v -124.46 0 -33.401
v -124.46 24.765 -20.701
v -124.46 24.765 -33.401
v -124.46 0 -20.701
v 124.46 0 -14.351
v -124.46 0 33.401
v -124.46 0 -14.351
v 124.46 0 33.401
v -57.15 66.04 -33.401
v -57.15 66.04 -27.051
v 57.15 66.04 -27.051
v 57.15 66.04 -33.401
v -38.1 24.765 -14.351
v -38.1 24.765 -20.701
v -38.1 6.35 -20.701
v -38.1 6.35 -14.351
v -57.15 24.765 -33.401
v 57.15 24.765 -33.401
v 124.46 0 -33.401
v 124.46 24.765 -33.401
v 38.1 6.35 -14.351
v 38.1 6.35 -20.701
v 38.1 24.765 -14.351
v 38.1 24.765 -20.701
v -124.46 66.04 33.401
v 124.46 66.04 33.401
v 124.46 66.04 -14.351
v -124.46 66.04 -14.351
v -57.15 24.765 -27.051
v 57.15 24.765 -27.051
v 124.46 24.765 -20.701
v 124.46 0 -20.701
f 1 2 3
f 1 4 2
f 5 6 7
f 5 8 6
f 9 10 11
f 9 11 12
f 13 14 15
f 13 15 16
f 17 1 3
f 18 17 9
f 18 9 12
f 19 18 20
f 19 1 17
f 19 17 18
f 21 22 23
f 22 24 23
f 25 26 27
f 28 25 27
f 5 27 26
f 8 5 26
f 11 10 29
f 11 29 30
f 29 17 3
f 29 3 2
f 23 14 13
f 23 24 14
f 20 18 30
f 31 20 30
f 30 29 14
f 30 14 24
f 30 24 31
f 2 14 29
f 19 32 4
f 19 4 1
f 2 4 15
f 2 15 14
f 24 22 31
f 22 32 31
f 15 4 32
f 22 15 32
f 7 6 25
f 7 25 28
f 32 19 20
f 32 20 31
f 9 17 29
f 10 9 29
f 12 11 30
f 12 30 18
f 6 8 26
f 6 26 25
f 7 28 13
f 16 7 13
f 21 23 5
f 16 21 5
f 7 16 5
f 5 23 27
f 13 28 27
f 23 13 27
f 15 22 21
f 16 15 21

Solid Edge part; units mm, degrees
sketch "Sketch1" plane through (0, 0, 0) normal (0, -1, 0) x (1, 0, 0)
  line L0 (-124.46, -33.401) -> (124.46, -33.401)
  line L1 (124.46, -33.401) -> (124.46, 33.401)
  line L2 (124.46, 33.401) -> (-124.46, 33.401)
  line L3 (-124.46, 33.401) -> (-124.46, -33.401)
  dimension "D1" = 248.92
  dimension "D2" = 66.802
extrude "Protrusion1" add sketch "Sketch1" against normal blind 66.04
sketch "Sketch2" plane through (0, 66.04, 0) normal (0, 1, 0) x (-1, 0, 0)
  line L0 (57.15, -33.401) -> (124.46, -33.401)
  line L1 (124.46, -33.401) -> (124.46, -14.351)
  line L2 (124.46, -14.351) -> (-124.46, -14.351)
  line L3 (-124.46, -14.351) -> (-124.46, -33.401)
  line L4 (-124.46, -33.401) -> (-57.15, -33.401)
  line L5 (-57.15, -27.051) -> (-57.15, -33.401)
  line L6 (57.15, -27.051) -> (-57.15, -27.051)
  line L7 (57.15, -33.401) -> (57.15, -27.051)
  dimension "D1" = 19.05
extrude "ExtrudedCutout_1" cut sketch "Sketch2" against normal blind 41.275
sketch "Sketch3" plane through (124.46, 33.02, 0) normal (1, 0, 0) x (0, 1, 0)
  line L0 (-33.02, -14.351) -> (-33.02, -20.701)
  line L1 (-33.02, -20.701) -> (-26.67, -20.701)
  line L2 (-26.67, -20.701) -> (-26.67, -14.351)
  line L3 (-26.67, -14.351) -> (-33.02, -14.351)
extrude "Cutout1" cut sketch "Sketch3" against normal through all
sketch "Sketch4" plane through (0, 24.765, -23.876) normal (0, 1, 0) x (-1, 0, 0)
  line L0 (-38.1, 3.175) -> (-124.46, 3.175)
  line L1 (-124.46, 9.525) -> (-124.46, 3.175)
  line L2 (-38.1, 9.525) -> (-124.46, 9.525)
  line L3 (-38.1, 3.175) -> (-38.1, 9.525)
  line L4 (124.46, 3.175) -> (38.1, 3.175)
  line L5 (38.1, 3.175) -> (38.1, 9.525)
  line L6 (38.1, 9.525) -> (124.46, 9.525)
  line L7 (124.46, 9.525) -> (124.46, 3.175)
  dimension "D1" = 76.2
extrude "Cutout2" cut sketch "Sketch4" against normal through all
properties material "ABS Plastic, high impact"
